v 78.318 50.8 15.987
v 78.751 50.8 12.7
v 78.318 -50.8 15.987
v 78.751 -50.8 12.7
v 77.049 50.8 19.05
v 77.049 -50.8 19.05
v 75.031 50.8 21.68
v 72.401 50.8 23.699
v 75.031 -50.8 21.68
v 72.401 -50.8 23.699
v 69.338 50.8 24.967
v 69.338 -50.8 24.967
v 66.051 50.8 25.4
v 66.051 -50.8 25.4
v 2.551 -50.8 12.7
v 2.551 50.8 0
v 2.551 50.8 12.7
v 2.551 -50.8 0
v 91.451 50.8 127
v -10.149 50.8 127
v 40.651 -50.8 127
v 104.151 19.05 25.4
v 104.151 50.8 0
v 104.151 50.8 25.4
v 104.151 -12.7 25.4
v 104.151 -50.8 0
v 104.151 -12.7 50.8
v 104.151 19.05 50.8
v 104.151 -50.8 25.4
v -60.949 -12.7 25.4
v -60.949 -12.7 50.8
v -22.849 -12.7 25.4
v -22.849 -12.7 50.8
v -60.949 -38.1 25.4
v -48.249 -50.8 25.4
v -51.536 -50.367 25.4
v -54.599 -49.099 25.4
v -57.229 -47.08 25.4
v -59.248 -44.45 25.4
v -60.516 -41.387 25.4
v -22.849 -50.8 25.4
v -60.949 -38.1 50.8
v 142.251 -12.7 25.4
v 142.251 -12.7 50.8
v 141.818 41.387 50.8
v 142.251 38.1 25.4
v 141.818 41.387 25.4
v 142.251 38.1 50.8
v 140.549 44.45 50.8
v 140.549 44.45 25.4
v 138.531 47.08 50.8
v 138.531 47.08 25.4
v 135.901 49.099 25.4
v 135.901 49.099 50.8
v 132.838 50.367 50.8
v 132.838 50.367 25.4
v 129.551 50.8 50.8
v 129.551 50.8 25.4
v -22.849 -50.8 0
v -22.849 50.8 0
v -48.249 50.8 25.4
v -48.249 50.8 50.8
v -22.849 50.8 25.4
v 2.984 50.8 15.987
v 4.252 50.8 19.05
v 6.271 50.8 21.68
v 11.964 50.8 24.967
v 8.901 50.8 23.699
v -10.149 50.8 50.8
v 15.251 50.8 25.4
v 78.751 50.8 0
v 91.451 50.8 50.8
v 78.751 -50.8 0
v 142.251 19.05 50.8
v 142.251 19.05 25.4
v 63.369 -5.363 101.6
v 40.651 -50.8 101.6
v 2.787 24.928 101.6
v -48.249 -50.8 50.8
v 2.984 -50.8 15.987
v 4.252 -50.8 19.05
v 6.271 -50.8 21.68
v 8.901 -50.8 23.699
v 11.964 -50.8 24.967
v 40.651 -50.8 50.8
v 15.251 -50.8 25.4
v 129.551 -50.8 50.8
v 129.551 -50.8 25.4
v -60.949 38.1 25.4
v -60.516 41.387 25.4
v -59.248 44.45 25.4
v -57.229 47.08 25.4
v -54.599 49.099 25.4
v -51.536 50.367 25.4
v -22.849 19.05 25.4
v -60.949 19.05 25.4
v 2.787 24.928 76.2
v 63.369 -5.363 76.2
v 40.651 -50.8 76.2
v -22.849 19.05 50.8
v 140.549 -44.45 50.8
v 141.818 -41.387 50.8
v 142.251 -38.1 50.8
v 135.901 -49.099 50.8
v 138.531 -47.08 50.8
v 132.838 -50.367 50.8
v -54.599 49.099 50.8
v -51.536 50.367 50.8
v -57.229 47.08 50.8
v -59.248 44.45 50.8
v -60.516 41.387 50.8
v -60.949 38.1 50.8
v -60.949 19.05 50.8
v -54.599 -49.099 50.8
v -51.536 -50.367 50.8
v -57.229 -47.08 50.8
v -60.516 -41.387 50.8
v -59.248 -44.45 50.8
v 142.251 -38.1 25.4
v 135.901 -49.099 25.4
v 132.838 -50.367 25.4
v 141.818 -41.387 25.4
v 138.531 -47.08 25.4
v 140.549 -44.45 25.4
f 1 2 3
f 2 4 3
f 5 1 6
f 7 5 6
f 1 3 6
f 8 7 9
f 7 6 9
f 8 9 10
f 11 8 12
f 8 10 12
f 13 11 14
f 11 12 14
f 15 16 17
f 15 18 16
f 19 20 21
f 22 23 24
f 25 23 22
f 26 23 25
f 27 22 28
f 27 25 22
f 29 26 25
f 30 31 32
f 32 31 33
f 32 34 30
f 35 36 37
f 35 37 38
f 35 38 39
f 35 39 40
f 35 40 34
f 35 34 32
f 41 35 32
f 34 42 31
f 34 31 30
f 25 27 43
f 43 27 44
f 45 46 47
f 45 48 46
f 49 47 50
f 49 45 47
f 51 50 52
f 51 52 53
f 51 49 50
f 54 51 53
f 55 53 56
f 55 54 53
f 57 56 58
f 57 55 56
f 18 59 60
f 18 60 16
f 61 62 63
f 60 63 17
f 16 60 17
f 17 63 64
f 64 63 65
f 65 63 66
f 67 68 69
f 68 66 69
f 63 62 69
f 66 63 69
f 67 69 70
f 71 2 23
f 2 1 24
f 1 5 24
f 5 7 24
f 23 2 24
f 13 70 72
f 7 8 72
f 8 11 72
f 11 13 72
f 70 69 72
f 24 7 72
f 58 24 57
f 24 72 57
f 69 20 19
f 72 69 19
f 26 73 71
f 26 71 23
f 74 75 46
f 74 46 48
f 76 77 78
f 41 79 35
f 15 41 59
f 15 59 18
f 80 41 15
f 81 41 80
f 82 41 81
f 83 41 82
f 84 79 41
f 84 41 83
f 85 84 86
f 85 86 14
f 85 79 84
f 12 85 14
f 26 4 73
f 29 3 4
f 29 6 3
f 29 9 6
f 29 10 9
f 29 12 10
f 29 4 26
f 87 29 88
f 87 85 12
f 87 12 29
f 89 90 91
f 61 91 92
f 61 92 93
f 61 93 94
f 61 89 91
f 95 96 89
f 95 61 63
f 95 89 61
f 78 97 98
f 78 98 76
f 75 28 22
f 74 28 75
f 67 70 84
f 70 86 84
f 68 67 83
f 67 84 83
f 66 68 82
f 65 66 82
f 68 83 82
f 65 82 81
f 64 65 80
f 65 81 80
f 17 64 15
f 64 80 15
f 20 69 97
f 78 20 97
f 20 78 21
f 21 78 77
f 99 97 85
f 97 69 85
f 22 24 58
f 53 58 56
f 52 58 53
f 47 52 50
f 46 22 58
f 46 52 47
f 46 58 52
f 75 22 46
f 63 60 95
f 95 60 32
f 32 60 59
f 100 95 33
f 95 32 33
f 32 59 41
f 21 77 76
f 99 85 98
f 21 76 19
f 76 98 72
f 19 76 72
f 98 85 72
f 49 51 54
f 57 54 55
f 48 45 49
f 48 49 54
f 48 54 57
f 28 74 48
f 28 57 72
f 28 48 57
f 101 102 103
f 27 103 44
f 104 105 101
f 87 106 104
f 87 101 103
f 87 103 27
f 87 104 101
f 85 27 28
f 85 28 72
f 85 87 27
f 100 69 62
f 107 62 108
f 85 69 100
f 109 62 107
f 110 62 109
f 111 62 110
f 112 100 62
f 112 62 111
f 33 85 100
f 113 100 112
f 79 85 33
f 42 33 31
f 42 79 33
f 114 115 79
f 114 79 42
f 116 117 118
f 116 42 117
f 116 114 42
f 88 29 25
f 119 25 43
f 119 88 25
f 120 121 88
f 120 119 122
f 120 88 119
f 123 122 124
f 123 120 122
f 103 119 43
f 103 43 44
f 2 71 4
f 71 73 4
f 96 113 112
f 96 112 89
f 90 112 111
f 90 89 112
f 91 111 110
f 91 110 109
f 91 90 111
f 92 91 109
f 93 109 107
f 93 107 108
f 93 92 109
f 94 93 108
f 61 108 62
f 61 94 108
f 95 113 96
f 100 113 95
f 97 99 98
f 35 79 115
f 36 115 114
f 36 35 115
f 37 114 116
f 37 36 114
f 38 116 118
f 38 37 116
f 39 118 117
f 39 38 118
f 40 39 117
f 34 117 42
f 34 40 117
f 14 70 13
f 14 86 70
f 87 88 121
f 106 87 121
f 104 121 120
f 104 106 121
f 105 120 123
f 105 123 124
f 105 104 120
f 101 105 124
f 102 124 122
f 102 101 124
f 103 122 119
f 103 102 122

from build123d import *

# Parameters (mm, degrees)
F0_W     = 25.4
F0_H     = 25.4
F1_DEPTH = 50.8
F2_W     = 38.1
F2_H     = 31.75
F3_DEPTH = 50.801
F4_R     = 12.7
F5_R     = 12.7
F7_DEPTH = 76.2
F8_W     = 50.8
F8_H     = 25.4
F9_DEPTH = 136.3117039084


with BuildPart() as f1:
    # F0 (on Front) → F1 (new body, symmetric)
    with BuildSketch(Plane.XZ):
        with Locations((-10.1491656572, 12.7)):
            Rectangle(F0_W, F0_H)
        with Locations((91.4508343428, 12.7)):
            Rectangle(F0_W, F0_H)
        Polygon((-22.8491656572, 25.4), (2.5508343428, 25.4), (78.7508343428, 25.4), (104.1508343428, 25.4), (127, 25.4), (142.2508343428, 25.4), (142.2508343428, 50.8), (-60.9491656572, 50.8), (-60.9491656572, 25.4), align=None)
    extrude(amount=F1_DEPTH, both=True)

    # F2 (on face) → F3 (cut, through all)
    with BuildSketch(Plane.XY.offset(50.8)):
        with Locations((-41.8991656572, 3.175)):
            Rectangle(F2_W, F2_H)
        with Locations((123.2008343428, 3.175)):
            Rectangle(F2_W, F2_H)
    extrude(amount=-F3_DEPTH, mode=Mode.SUBTRACT)

    # F4
    f4_edges = [f1.edges().sort_by_distance(p)[0] for p in [
        (142.250834, -50.8, 38.1),
        (142.250834, 50.8, 38.1),
        (-60.949166, -50.8, 38.1),
        (-60.949166, 50.8, 38.1),
    ]]
    fillet(f4_edges, radius=F4_R)

    # F5
    f5_edges = [f1.edges().sort_by_distance(p)[0] for p in [
        (2.550834, 0, 25.4),
        (78.750834, 0, 25.4),
    ]]
    fillet(f5_edges, radius=F5_R)

    # F6 (on face) → F7 (join)
    with BuildSketch(Plane.XY.offset(50.8)):
        Polygon((91.4508343428, 50.8), (40.6508343428, 50.8), (-10.1491656572, 50.8), (40.6508343428, -50.8), align=None)
    extrude(amount=F7_DEPTH)

    # F8 (on face) → F9 (cut, through all)
    with BuildSketch(Plane(origin=(52.8406674742, -26.4203337371, 0), x_dir=(0.4472135955, 0.894427191, 0), z_dir=(0.894427191, -0.4472135955, 0))):
        with Locations((-1.8572955163, 88.9)):
            Rectangle(F8_W, F8_H)
    extrude(amount=-F9_DEPTH, mode=Mode.SUBTRACT)


solid = f1.part
